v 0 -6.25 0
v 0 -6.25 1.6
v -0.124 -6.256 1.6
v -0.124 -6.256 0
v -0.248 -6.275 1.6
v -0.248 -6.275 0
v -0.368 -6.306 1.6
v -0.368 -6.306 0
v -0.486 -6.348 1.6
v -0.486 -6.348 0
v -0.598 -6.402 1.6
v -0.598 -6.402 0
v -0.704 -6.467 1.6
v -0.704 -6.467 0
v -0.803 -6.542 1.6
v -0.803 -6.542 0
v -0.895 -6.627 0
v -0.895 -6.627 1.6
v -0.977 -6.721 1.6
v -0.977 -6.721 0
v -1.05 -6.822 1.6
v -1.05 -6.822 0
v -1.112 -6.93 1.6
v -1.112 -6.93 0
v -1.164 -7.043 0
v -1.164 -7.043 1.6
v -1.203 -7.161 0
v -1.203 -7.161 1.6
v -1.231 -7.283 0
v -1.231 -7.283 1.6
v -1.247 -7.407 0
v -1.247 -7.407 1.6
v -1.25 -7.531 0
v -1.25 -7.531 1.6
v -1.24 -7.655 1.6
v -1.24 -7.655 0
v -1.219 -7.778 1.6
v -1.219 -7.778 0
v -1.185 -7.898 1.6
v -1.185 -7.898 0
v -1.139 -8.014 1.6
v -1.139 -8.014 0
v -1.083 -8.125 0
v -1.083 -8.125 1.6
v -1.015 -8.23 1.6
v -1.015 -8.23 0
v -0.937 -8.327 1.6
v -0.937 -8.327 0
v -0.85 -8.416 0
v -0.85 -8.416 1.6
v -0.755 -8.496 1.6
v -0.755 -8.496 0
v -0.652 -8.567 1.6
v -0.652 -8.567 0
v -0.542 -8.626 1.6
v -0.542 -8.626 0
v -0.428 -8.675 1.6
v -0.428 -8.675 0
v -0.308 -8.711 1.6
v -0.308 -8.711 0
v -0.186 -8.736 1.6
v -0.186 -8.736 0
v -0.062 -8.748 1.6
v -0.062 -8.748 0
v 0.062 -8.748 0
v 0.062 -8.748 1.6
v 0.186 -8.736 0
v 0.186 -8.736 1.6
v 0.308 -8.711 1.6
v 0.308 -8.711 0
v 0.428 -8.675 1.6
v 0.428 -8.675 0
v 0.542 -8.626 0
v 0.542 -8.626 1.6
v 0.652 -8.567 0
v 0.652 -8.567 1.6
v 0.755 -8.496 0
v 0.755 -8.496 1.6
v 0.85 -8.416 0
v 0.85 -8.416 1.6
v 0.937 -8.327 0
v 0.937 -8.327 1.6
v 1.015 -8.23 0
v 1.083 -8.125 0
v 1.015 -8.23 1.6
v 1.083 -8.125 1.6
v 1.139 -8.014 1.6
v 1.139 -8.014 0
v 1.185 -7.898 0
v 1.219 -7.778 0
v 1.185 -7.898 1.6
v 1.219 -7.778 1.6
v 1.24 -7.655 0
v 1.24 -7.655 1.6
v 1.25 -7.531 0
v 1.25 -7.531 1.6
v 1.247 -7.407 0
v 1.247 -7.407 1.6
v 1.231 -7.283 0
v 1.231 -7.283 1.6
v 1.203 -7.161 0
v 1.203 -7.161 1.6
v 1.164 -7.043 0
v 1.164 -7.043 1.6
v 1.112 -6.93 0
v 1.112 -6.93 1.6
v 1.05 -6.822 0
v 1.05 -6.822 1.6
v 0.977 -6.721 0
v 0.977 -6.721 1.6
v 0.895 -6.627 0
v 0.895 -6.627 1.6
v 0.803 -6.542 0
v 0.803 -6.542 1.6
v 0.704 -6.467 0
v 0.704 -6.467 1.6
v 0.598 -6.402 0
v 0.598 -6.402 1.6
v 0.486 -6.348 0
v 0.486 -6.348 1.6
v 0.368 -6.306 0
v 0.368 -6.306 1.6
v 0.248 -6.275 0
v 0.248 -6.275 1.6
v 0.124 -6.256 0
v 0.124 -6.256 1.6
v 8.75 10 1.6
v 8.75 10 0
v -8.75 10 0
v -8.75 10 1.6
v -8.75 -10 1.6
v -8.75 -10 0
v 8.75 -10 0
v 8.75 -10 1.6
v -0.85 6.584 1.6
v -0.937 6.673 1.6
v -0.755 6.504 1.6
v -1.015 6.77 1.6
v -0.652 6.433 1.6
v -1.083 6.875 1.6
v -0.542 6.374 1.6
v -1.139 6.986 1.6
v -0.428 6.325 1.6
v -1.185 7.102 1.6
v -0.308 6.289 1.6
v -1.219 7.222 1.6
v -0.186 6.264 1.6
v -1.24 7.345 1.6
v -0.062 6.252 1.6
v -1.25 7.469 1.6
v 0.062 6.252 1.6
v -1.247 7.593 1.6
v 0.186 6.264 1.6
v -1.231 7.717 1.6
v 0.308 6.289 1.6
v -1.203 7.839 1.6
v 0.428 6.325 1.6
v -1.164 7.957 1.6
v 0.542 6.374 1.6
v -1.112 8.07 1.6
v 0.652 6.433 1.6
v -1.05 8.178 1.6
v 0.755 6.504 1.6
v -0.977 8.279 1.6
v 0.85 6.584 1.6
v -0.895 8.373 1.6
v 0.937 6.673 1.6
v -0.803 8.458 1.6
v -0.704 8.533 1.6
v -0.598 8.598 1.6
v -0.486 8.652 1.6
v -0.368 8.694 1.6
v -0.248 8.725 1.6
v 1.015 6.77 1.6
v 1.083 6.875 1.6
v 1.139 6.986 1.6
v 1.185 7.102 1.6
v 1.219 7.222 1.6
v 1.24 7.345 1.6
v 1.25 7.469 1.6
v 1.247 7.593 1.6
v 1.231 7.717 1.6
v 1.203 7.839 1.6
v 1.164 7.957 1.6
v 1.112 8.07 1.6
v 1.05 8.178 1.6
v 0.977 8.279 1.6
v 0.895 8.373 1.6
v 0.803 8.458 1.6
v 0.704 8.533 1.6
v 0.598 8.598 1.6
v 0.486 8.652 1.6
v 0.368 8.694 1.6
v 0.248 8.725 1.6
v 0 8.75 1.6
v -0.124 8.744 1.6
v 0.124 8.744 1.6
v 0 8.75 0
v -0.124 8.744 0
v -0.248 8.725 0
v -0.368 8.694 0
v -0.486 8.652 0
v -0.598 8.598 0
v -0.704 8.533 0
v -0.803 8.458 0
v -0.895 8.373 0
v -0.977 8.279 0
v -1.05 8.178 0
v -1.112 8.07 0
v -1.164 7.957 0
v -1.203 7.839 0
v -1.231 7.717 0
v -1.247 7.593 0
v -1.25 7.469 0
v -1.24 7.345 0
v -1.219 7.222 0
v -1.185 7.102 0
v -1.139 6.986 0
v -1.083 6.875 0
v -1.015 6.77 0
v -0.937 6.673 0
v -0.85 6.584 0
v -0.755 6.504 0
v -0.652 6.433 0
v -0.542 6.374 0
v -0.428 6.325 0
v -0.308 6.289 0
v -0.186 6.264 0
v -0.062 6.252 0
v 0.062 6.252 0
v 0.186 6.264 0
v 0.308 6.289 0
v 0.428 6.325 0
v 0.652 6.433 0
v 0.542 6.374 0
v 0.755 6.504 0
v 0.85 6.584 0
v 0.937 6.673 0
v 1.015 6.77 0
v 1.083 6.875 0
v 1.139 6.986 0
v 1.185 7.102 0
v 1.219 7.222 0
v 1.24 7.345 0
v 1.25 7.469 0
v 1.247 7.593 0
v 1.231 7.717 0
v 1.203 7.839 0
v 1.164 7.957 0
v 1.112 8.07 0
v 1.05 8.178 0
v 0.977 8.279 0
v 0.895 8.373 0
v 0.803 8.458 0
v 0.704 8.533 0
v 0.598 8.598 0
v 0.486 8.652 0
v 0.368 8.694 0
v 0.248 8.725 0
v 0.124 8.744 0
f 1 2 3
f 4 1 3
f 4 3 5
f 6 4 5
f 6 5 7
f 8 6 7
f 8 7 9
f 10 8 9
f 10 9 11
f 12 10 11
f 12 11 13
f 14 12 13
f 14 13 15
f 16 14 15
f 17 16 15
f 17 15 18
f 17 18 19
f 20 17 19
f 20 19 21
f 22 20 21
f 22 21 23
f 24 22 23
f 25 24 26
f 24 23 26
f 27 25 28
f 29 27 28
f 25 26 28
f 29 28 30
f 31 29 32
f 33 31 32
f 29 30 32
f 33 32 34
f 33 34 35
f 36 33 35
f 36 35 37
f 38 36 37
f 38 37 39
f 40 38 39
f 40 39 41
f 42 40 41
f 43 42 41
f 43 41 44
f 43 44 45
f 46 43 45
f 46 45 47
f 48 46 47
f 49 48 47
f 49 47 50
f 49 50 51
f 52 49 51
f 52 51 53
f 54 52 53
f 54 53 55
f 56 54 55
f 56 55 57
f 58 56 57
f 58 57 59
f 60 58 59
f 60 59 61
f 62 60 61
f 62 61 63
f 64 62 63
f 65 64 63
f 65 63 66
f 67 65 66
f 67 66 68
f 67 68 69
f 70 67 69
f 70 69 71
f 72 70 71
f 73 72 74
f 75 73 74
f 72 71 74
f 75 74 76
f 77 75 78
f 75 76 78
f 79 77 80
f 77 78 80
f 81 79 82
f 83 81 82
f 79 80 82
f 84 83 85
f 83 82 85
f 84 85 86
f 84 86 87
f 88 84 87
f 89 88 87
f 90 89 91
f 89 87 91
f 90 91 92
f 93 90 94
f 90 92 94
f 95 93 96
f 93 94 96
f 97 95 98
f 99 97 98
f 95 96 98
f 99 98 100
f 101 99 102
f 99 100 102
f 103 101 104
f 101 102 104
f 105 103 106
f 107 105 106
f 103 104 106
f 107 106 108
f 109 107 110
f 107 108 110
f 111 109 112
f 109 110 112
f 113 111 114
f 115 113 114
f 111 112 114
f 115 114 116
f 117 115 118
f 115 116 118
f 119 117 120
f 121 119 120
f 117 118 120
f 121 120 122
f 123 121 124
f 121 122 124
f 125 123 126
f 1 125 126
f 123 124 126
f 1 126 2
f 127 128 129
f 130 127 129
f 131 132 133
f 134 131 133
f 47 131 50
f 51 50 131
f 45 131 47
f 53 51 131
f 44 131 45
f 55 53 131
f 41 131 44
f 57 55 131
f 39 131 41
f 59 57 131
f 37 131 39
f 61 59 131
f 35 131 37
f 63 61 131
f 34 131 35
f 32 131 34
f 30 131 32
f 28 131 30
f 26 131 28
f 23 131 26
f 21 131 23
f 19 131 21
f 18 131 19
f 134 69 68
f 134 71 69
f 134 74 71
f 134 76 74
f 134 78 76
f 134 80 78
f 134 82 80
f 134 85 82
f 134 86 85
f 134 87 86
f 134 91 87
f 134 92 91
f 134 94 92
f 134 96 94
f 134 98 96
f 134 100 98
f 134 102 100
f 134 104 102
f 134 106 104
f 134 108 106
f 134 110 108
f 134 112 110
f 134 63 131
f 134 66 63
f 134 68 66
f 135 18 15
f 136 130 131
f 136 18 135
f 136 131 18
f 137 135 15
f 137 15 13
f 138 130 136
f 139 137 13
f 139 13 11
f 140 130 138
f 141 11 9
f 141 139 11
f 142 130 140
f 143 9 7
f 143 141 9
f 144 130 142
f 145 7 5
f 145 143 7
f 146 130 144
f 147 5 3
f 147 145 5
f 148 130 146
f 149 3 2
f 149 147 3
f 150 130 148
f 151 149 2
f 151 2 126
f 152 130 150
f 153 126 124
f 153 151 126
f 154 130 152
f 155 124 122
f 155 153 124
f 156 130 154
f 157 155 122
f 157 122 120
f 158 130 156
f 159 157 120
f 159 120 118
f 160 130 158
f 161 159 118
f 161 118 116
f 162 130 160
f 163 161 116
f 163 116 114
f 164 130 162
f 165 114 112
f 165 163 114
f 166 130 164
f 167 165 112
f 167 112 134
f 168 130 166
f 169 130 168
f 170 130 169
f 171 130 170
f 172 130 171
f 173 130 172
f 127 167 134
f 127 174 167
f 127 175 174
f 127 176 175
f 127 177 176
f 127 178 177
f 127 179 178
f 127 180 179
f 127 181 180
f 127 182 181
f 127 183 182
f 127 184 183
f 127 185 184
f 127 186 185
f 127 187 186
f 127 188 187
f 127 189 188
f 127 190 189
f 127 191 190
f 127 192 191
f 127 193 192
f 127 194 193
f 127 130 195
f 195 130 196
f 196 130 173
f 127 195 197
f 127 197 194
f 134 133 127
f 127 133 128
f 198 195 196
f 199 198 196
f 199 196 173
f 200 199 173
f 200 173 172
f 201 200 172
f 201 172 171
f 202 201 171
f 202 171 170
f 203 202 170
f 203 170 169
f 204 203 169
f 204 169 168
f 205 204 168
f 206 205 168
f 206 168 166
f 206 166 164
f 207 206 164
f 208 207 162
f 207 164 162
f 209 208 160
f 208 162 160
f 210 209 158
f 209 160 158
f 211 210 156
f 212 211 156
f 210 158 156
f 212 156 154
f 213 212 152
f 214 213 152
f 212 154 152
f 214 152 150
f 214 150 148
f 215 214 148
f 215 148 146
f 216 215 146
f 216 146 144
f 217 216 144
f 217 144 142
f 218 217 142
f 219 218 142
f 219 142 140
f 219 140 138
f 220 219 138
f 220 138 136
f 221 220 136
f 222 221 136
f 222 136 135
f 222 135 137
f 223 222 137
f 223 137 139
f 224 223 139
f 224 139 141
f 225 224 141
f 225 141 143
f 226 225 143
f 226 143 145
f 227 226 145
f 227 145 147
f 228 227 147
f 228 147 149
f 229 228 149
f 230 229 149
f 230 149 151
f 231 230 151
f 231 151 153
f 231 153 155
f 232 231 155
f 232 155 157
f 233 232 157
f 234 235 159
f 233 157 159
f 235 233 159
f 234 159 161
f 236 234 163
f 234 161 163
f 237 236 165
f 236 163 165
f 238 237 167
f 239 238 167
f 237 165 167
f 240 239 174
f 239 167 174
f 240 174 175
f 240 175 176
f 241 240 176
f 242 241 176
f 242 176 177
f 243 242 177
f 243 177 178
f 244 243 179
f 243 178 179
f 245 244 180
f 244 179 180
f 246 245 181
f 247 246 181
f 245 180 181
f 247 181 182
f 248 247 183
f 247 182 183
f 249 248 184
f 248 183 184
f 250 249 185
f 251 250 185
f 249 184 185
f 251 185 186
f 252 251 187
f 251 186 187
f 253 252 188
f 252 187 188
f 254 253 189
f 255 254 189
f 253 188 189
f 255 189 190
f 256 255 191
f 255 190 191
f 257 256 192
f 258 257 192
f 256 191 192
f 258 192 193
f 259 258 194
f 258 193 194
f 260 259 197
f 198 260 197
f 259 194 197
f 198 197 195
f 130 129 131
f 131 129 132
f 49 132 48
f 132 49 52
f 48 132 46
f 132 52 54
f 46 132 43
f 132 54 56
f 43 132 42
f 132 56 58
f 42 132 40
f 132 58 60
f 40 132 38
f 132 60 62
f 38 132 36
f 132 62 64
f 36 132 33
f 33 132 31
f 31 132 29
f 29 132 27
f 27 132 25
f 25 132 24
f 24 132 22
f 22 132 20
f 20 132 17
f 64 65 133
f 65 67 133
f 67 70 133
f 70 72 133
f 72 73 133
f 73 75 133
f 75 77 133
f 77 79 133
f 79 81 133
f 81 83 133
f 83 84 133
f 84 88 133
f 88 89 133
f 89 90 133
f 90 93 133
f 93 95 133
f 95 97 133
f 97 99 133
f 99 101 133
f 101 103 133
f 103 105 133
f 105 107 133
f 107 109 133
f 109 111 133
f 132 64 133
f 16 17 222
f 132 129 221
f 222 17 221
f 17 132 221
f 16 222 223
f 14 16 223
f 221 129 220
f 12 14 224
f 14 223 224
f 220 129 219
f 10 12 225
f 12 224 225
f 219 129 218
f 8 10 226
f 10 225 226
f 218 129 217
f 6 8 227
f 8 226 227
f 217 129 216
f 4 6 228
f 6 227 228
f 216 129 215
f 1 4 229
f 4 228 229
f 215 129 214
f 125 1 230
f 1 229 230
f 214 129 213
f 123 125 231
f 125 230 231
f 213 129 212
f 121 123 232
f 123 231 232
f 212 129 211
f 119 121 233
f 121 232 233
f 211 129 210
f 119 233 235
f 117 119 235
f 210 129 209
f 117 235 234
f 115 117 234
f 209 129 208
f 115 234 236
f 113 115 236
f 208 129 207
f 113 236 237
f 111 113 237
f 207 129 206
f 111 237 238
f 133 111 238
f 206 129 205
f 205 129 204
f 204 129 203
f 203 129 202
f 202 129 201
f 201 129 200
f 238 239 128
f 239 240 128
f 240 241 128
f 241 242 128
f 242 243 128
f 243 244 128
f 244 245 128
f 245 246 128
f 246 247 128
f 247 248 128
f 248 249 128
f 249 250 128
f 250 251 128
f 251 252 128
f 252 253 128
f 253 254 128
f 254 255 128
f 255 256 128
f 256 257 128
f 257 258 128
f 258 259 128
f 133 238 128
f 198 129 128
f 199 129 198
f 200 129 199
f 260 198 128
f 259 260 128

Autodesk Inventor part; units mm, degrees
ref_plane "YZ Plane" through (0, 0, 0) normal (1, 0, 0) x (0, 1, 0)
ref_plane "XZ Plane" through (0, 0, 0) normal (0, 1, 0) x (-1, 0, 0)
ref_plane "XY Plane" through (0, 0, 0) normal (0, 0, 1) x (1, 0, 0)
sketch "Sketch1" plane through (0, 0, 0) normal (0, 0, 1) x (1, 0, 0)
  line L0 (8.75, 10) -> (-8.75, 10)
  line L1 (-8.75, 10) -> (-8.75, -10)
  line L2 (-8.75, -10) -> (8.75, -10)
  line L3 (8.75, -10) -> (8.75, 10)
  line L4 (8.75, 10) -> (-8.75, -10) construction
  line L5 (-8.75, 10) -> (8.75, -10) construction
  line L6 (0, 10) -> (0, -10) construction
  line L7 (8.75, 0) -> (-8.75, 0) construction
  line L8 (0, -10) -> (0, 10) construction
  line L9 (0, -7.5) -> (0, 7.5) construction
  point P0 (0, 0)
  point P1 (0, 0)
  dimension "d0" = 17.5
  dimension "d1" = 20
  dimension "d19" = 15
extrude "Extrusion1" add sketch "Sketch1" along normal blind 1.6
hole "Phi2.5" at (0, -7.5, 0) at (0, 7.5, 0) direction (0, 0, 1) diameter 2.5 end through all
properties part number "SUSTAINA-SCI-EXTENSION-BORAD" material "CFRP"
